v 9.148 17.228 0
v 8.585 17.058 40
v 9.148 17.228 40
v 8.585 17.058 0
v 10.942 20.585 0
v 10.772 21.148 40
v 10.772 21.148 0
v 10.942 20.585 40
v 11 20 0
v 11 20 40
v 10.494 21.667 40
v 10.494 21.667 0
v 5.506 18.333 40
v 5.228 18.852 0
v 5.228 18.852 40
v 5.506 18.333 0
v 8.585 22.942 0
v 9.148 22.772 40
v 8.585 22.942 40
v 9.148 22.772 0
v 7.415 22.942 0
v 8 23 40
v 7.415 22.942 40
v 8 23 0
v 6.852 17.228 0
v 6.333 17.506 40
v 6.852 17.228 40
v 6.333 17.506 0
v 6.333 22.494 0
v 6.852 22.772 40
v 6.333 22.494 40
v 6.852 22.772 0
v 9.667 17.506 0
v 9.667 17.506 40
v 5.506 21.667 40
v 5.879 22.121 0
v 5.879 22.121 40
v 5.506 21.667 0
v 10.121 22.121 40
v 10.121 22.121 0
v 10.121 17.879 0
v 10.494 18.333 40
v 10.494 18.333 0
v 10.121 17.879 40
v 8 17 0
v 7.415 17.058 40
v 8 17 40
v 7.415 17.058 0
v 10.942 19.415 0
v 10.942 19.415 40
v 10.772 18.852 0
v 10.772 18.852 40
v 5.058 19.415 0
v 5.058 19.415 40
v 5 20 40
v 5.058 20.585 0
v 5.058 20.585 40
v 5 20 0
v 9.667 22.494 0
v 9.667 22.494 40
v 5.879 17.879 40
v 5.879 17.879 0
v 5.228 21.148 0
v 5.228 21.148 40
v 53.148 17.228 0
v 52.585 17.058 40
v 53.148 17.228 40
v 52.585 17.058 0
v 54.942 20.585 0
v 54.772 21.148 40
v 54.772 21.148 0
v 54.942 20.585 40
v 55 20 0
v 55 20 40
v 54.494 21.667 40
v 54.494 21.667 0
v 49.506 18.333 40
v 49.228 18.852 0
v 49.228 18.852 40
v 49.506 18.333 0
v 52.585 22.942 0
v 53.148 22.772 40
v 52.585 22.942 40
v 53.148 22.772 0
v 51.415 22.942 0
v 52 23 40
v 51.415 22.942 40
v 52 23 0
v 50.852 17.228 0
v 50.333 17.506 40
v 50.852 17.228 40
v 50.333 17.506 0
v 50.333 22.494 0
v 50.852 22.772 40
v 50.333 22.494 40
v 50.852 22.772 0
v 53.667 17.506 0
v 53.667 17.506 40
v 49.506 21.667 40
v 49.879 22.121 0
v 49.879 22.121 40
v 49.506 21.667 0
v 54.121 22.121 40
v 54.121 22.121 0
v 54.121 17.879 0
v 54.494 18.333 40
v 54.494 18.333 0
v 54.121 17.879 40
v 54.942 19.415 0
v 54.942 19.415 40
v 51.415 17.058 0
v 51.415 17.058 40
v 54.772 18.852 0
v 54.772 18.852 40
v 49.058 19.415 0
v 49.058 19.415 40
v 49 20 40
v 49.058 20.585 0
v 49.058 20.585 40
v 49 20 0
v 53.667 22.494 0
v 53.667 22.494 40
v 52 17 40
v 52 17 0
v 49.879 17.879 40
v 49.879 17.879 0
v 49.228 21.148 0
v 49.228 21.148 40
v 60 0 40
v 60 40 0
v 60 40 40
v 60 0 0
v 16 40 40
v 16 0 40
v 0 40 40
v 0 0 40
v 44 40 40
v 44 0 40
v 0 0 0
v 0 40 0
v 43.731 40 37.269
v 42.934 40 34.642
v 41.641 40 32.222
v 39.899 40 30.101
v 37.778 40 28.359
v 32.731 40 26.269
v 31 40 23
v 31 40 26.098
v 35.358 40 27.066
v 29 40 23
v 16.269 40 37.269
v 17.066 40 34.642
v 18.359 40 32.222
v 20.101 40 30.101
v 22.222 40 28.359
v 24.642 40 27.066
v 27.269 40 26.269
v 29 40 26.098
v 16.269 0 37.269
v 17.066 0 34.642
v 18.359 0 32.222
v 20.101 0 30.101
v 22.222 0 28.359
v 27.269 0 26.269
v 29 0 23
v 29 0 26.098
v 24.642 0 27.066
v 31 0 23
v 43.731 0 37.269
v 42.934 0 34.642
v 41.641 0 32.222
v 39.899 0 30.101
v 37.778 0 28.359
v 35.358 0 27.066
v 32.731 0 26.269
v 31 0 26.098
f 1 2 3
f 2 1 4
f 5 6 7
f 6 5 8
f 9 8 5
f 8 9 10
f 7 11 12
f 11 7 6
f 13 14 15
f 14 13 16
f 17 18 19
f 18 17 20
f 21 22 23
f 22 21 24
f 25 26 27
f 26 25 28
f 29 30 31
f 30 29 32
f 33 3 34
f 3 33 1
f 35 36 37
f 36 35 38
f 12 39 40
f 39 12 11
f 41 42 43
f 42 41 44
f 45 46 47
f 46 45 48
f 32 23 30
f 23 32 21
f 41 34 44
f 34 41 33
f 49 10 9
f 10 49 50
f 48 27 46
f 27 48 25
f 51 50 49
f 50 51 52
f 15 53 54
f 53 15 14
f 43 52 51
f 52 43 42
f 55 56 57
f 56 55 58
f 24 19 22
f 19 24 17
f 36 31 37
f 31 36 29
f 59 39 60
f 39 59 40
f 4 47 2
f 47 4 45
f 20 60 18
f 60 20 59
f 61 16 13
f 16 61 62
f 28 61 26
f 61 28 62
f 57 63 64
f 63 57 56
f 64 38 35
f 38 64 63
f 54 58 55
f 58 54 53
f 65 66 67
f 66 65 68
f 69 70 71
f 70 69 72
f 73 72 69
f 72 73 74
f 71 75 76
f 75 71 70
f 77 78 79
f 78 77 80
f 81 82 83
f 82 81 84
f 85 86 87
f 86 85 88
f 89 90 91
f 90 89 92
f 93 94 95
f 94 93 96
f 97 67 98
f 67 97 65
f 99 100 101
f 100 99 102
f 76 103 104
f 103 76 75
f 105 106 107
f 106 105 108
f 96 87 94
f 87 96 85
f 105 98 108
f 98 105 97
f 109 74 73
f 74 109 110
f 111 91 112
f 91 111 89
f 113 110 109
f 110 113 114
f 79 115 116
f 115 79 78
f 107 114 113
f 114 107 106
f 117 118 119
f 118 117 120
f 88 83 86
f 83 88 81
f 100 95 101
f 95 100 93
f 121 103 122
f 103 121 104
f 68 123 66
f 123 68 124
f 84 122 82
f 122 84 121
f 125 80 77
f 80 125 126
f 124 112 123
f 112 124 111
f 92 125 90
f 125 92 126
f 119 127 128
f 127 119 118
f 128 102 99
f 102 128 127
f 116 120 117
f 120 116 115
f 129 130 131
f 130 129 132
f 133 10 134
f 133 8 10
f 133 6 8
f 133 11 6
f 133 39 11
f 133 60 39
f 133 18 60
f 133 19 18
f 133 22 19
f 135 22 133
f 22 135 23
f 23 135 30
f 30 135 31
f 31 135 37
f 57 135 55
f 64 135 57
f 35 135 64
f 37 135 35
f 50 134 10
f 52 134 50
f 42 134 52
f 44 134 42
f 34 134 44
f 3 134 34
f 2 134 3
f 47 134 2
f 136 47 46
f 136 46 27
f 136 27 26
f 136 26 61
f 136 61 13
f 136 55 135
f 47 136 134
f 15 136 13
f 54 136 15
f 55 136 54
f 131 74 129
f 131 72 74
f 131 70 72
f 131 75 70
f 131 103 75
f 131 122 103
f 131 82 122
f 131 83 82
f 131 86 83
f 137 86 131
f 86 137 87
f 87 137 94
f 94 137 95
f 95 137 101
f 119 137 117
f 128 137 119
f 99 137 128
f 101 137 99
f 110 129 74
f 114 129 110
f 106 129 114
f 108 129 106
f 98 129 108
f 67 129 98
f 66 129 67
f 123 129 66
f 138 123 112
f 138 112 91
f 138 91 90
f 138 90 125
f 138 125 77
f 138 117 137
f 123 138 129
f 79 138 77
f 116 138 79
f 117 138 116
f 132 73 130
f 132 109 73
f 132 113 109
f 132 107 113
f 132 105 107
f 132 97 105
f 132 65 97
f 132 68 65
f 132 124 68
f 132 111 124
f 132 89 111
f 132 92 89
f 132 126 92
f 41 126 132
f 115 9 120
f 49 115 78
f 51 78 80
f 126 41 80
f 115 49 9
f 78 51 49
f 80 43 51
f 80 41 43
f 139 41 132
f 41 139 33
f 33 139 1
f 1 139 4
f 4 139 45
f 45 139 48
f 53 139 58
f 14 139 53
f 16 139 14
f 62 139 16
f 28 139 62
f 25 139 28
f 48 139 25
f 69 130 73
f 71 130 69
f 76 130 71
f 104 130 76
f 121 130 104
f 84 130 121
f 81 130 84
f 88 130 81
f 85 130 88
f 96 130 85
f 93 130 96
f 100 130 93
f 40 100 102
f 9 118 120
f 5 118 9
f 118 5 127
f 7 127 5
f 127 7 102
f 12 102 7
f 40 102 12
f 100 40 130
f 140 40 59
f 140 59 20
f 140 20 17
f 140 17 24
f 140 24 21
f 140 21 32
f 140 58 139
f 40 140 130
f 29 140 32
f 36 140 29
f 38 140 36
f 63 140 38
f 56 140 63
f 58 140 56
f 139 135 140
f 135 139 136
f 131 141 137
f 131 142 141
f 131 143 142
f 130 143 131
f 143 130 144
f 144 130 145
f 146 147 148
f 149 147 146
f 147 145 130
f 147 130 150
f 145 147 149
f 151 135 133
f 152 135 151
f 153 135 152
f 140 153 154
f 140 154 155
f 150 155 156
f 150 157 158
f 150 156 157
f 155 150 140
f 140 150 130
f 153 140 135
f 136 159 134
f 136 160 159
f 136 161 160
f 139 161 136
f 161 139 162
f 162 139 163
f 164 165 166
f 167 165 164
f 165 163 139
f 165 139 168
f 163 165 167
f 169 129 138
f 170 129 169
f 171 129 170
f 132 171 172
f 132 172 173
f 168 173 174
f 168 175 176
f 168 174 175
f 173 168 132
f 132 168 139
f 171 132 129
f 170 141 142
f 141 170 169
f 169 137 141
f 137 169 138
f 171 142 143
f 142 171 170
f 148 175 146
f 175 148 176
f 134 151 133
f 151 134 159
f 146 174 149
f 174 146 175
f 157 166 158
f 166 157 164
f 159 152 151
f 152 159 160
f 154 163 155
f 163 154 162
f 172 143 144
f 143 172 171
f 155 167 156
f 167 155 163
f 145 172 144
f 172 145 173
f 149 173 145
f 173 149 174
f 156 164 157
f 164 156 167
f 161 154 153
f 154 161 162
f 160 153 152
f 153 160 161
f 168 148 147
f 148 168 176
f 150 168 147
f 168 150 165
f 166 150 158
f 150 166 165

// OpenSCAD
$fn = 32;

// ----------------------------------------------------------------------
// Saddle clamp: split shaft clamp
// ----------------------------------------------------------------------

// --- parameters (mm) ---
blk_l = 60;               // block length, X
blk_w = 40;               // block width, Y
blk_h = 40;               // block height
clamp_r = 14;             // shaft groove radius
hole_r = 3;               // bolt hole radius
hole_m = 8;               // bolt hole margin from the ends
saw_w = 2;                // saw kerf width
fit_tol = 0.05;           // tolerance for press fits, mm
free_tol = 0.2;           // tolerance for clearance fits, mm

saw_depth = clamp_r + 3;  // saw kerf depth

difference() {
  cube([blk_l, blk_w, blk_h]);
  translate([blk_l / 2, -1, blk_h])
    rotate([-90, 0, 0])
      cylinder(h = blk_w + 2, r = clamp_r);
  for (sx = [0, 1])
    translate([sx ? blk_l - hole_m : hole_m, blk_w / 2, -1])
      cylinder(r = hole_r, h = blk_h + 2);
  translate([blk_l / 2 - saw_w / 2, -1, blk_h - saw_depth])
    cube([saw_w, blk_w + 2, saw_depth + 1]);
}
